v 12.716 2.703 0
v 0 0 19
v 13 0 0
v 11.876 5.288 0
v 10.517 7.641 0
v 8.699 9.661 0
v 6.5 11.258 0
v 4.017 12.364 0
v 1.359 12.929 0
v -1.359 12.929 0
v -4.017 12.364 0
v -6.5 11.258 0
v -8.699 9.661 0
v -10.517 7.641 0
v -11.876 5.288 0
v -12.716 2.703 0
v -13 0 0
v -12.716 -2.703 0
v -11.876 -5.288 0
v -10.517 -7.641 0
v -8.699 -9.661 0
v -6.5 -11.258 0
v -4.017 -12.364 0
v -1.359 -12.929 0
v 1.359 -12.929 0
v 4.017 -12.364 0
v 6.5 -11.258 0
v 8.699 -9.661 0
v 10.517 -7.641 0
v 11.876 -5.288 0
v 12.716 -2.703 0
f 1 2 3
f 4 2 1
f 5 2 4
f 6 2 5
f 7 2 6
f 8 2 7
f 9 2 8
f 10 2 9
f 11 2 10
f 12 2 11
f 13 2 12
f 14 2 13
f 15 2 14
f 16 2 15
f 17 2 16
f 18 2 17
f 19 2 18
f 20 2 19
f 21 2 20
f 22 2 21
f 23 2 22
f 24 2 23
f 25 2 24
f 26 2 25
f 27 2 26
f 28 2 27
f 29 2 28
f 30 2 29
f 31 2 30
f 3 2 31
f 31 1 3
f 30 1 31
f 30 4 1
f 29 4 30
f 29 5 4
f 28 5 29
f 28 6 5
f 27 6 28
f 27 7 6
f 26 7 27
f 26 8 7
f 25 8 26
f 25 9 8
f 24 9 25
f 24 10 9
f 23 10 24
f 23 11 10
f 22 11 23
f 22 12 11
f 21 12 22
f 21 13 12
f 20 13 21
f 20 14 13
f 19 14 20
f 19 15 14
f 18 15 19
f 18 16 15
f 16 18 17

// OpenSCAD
// Generated by SolidPython 1.0.1 on 2020-07-29 00:46:43


cylinder(h = 19, r1 = 13, r2 = 0);
/***********************************************
*********      SolidPython code:      **********
************************************************
 
# import packages: SolidPython
from solid import *
from solid.utils import *
from itertools import chain, combinations, permutations


class Resize:

    def __init__(self, scad_file):
        self.scad_file = scad_file
        #self.scad_file = import_scad(scad_file)
        # cone/cylinder param:
        self.r1 = 0
        self.r2 = 0
        self.h = 0
        # rectangular prism param:
        self.w = 0
        self.l = 0
        # ellipse param:
        self.r = 0

    # import OpenScad code (file name corresponds to shape)


    # classify shape + parameters
    def assign(self, param1, param2, param3):
        if self.scad_file == 'cone.scad':
            self.r1 = param1
            self.r2 = param2
            self.h = param3
        elif self.scad_file == 'cylinder.scad':
            self.r1 = param1
            self.r2 = param2
            self.h = param3
        elif self.scad_file == 'rectangularPrism.scad':
            self.h = param1
            self.l = param2
            self.w = param3
        else:
            self.r = param1
            self.h = param2

    # resize parameters
    def iterate(self):
        x = range(3, 20, 2)
        i = 1
        if self.scad_file == 'cone.scad':
            tempList = list(permutations(x, 2))
            for temp in tempList:
                param1 = temp[0]
                param2 = temp[1]
                filepath = 'produced_scad_files/' + 'cone' + str(param1) + '_' + str(param2) + '_' + '.scad'
                scad_render_to_file(cylinder(h=param1, r1=param2, r2=0), filepath)

        elif self.scad_file == 'cylinder.scad':
            tempList = list(permutations(x, 3))
            for temp in tempList:
                param1 = temp[0]
                param2 = temp[1]
                filepath = 'produced_scad_files/' + 'cylinder' + str(param1) + '_' + str(param2) + '_' + '.scad'
                scad_render_to_file(cylinder(h=param1, r1=param2, r2=param2), filepath)

        elif self.scad_file == 'rectangularPrism.scad':
            tempList = list(permutations(x, 3))
            for temp in tempList:
                param1 = temp[0]
                param2 = temp[1]
                param3 = temp[2]
                filepath = 'produced_scad_files/' + 'rectangularPrism' + str(param1) + '_' + str(param2) + '_' + str(
                    param3) + '.scad'
                scad_render_to_file(cube(size=(param1, param2, param3)), filepath)

        elif self.scad_file == 'ellipse.scad':
            tempList = list(permutations(x, 4))
            for temp in tempList:
                param1 = temp[0]
                param2 = temp[1]
                param3 = temp[2]
                param4 = temp[3]
                filepath = 'produced_scad_files/' + 'ellipse' + str(param1) + '_' + str(param2) + '_' + str(param3) + '_' + str(param4) + '.scad'
                scad_render_to_file(scale([param1, param2, param3])(sphere(r=param4)), filepath)

    def render_to_scadfile(self):
        scad_render_to_file(scad, 'example.scad') 
 
************************************************/
